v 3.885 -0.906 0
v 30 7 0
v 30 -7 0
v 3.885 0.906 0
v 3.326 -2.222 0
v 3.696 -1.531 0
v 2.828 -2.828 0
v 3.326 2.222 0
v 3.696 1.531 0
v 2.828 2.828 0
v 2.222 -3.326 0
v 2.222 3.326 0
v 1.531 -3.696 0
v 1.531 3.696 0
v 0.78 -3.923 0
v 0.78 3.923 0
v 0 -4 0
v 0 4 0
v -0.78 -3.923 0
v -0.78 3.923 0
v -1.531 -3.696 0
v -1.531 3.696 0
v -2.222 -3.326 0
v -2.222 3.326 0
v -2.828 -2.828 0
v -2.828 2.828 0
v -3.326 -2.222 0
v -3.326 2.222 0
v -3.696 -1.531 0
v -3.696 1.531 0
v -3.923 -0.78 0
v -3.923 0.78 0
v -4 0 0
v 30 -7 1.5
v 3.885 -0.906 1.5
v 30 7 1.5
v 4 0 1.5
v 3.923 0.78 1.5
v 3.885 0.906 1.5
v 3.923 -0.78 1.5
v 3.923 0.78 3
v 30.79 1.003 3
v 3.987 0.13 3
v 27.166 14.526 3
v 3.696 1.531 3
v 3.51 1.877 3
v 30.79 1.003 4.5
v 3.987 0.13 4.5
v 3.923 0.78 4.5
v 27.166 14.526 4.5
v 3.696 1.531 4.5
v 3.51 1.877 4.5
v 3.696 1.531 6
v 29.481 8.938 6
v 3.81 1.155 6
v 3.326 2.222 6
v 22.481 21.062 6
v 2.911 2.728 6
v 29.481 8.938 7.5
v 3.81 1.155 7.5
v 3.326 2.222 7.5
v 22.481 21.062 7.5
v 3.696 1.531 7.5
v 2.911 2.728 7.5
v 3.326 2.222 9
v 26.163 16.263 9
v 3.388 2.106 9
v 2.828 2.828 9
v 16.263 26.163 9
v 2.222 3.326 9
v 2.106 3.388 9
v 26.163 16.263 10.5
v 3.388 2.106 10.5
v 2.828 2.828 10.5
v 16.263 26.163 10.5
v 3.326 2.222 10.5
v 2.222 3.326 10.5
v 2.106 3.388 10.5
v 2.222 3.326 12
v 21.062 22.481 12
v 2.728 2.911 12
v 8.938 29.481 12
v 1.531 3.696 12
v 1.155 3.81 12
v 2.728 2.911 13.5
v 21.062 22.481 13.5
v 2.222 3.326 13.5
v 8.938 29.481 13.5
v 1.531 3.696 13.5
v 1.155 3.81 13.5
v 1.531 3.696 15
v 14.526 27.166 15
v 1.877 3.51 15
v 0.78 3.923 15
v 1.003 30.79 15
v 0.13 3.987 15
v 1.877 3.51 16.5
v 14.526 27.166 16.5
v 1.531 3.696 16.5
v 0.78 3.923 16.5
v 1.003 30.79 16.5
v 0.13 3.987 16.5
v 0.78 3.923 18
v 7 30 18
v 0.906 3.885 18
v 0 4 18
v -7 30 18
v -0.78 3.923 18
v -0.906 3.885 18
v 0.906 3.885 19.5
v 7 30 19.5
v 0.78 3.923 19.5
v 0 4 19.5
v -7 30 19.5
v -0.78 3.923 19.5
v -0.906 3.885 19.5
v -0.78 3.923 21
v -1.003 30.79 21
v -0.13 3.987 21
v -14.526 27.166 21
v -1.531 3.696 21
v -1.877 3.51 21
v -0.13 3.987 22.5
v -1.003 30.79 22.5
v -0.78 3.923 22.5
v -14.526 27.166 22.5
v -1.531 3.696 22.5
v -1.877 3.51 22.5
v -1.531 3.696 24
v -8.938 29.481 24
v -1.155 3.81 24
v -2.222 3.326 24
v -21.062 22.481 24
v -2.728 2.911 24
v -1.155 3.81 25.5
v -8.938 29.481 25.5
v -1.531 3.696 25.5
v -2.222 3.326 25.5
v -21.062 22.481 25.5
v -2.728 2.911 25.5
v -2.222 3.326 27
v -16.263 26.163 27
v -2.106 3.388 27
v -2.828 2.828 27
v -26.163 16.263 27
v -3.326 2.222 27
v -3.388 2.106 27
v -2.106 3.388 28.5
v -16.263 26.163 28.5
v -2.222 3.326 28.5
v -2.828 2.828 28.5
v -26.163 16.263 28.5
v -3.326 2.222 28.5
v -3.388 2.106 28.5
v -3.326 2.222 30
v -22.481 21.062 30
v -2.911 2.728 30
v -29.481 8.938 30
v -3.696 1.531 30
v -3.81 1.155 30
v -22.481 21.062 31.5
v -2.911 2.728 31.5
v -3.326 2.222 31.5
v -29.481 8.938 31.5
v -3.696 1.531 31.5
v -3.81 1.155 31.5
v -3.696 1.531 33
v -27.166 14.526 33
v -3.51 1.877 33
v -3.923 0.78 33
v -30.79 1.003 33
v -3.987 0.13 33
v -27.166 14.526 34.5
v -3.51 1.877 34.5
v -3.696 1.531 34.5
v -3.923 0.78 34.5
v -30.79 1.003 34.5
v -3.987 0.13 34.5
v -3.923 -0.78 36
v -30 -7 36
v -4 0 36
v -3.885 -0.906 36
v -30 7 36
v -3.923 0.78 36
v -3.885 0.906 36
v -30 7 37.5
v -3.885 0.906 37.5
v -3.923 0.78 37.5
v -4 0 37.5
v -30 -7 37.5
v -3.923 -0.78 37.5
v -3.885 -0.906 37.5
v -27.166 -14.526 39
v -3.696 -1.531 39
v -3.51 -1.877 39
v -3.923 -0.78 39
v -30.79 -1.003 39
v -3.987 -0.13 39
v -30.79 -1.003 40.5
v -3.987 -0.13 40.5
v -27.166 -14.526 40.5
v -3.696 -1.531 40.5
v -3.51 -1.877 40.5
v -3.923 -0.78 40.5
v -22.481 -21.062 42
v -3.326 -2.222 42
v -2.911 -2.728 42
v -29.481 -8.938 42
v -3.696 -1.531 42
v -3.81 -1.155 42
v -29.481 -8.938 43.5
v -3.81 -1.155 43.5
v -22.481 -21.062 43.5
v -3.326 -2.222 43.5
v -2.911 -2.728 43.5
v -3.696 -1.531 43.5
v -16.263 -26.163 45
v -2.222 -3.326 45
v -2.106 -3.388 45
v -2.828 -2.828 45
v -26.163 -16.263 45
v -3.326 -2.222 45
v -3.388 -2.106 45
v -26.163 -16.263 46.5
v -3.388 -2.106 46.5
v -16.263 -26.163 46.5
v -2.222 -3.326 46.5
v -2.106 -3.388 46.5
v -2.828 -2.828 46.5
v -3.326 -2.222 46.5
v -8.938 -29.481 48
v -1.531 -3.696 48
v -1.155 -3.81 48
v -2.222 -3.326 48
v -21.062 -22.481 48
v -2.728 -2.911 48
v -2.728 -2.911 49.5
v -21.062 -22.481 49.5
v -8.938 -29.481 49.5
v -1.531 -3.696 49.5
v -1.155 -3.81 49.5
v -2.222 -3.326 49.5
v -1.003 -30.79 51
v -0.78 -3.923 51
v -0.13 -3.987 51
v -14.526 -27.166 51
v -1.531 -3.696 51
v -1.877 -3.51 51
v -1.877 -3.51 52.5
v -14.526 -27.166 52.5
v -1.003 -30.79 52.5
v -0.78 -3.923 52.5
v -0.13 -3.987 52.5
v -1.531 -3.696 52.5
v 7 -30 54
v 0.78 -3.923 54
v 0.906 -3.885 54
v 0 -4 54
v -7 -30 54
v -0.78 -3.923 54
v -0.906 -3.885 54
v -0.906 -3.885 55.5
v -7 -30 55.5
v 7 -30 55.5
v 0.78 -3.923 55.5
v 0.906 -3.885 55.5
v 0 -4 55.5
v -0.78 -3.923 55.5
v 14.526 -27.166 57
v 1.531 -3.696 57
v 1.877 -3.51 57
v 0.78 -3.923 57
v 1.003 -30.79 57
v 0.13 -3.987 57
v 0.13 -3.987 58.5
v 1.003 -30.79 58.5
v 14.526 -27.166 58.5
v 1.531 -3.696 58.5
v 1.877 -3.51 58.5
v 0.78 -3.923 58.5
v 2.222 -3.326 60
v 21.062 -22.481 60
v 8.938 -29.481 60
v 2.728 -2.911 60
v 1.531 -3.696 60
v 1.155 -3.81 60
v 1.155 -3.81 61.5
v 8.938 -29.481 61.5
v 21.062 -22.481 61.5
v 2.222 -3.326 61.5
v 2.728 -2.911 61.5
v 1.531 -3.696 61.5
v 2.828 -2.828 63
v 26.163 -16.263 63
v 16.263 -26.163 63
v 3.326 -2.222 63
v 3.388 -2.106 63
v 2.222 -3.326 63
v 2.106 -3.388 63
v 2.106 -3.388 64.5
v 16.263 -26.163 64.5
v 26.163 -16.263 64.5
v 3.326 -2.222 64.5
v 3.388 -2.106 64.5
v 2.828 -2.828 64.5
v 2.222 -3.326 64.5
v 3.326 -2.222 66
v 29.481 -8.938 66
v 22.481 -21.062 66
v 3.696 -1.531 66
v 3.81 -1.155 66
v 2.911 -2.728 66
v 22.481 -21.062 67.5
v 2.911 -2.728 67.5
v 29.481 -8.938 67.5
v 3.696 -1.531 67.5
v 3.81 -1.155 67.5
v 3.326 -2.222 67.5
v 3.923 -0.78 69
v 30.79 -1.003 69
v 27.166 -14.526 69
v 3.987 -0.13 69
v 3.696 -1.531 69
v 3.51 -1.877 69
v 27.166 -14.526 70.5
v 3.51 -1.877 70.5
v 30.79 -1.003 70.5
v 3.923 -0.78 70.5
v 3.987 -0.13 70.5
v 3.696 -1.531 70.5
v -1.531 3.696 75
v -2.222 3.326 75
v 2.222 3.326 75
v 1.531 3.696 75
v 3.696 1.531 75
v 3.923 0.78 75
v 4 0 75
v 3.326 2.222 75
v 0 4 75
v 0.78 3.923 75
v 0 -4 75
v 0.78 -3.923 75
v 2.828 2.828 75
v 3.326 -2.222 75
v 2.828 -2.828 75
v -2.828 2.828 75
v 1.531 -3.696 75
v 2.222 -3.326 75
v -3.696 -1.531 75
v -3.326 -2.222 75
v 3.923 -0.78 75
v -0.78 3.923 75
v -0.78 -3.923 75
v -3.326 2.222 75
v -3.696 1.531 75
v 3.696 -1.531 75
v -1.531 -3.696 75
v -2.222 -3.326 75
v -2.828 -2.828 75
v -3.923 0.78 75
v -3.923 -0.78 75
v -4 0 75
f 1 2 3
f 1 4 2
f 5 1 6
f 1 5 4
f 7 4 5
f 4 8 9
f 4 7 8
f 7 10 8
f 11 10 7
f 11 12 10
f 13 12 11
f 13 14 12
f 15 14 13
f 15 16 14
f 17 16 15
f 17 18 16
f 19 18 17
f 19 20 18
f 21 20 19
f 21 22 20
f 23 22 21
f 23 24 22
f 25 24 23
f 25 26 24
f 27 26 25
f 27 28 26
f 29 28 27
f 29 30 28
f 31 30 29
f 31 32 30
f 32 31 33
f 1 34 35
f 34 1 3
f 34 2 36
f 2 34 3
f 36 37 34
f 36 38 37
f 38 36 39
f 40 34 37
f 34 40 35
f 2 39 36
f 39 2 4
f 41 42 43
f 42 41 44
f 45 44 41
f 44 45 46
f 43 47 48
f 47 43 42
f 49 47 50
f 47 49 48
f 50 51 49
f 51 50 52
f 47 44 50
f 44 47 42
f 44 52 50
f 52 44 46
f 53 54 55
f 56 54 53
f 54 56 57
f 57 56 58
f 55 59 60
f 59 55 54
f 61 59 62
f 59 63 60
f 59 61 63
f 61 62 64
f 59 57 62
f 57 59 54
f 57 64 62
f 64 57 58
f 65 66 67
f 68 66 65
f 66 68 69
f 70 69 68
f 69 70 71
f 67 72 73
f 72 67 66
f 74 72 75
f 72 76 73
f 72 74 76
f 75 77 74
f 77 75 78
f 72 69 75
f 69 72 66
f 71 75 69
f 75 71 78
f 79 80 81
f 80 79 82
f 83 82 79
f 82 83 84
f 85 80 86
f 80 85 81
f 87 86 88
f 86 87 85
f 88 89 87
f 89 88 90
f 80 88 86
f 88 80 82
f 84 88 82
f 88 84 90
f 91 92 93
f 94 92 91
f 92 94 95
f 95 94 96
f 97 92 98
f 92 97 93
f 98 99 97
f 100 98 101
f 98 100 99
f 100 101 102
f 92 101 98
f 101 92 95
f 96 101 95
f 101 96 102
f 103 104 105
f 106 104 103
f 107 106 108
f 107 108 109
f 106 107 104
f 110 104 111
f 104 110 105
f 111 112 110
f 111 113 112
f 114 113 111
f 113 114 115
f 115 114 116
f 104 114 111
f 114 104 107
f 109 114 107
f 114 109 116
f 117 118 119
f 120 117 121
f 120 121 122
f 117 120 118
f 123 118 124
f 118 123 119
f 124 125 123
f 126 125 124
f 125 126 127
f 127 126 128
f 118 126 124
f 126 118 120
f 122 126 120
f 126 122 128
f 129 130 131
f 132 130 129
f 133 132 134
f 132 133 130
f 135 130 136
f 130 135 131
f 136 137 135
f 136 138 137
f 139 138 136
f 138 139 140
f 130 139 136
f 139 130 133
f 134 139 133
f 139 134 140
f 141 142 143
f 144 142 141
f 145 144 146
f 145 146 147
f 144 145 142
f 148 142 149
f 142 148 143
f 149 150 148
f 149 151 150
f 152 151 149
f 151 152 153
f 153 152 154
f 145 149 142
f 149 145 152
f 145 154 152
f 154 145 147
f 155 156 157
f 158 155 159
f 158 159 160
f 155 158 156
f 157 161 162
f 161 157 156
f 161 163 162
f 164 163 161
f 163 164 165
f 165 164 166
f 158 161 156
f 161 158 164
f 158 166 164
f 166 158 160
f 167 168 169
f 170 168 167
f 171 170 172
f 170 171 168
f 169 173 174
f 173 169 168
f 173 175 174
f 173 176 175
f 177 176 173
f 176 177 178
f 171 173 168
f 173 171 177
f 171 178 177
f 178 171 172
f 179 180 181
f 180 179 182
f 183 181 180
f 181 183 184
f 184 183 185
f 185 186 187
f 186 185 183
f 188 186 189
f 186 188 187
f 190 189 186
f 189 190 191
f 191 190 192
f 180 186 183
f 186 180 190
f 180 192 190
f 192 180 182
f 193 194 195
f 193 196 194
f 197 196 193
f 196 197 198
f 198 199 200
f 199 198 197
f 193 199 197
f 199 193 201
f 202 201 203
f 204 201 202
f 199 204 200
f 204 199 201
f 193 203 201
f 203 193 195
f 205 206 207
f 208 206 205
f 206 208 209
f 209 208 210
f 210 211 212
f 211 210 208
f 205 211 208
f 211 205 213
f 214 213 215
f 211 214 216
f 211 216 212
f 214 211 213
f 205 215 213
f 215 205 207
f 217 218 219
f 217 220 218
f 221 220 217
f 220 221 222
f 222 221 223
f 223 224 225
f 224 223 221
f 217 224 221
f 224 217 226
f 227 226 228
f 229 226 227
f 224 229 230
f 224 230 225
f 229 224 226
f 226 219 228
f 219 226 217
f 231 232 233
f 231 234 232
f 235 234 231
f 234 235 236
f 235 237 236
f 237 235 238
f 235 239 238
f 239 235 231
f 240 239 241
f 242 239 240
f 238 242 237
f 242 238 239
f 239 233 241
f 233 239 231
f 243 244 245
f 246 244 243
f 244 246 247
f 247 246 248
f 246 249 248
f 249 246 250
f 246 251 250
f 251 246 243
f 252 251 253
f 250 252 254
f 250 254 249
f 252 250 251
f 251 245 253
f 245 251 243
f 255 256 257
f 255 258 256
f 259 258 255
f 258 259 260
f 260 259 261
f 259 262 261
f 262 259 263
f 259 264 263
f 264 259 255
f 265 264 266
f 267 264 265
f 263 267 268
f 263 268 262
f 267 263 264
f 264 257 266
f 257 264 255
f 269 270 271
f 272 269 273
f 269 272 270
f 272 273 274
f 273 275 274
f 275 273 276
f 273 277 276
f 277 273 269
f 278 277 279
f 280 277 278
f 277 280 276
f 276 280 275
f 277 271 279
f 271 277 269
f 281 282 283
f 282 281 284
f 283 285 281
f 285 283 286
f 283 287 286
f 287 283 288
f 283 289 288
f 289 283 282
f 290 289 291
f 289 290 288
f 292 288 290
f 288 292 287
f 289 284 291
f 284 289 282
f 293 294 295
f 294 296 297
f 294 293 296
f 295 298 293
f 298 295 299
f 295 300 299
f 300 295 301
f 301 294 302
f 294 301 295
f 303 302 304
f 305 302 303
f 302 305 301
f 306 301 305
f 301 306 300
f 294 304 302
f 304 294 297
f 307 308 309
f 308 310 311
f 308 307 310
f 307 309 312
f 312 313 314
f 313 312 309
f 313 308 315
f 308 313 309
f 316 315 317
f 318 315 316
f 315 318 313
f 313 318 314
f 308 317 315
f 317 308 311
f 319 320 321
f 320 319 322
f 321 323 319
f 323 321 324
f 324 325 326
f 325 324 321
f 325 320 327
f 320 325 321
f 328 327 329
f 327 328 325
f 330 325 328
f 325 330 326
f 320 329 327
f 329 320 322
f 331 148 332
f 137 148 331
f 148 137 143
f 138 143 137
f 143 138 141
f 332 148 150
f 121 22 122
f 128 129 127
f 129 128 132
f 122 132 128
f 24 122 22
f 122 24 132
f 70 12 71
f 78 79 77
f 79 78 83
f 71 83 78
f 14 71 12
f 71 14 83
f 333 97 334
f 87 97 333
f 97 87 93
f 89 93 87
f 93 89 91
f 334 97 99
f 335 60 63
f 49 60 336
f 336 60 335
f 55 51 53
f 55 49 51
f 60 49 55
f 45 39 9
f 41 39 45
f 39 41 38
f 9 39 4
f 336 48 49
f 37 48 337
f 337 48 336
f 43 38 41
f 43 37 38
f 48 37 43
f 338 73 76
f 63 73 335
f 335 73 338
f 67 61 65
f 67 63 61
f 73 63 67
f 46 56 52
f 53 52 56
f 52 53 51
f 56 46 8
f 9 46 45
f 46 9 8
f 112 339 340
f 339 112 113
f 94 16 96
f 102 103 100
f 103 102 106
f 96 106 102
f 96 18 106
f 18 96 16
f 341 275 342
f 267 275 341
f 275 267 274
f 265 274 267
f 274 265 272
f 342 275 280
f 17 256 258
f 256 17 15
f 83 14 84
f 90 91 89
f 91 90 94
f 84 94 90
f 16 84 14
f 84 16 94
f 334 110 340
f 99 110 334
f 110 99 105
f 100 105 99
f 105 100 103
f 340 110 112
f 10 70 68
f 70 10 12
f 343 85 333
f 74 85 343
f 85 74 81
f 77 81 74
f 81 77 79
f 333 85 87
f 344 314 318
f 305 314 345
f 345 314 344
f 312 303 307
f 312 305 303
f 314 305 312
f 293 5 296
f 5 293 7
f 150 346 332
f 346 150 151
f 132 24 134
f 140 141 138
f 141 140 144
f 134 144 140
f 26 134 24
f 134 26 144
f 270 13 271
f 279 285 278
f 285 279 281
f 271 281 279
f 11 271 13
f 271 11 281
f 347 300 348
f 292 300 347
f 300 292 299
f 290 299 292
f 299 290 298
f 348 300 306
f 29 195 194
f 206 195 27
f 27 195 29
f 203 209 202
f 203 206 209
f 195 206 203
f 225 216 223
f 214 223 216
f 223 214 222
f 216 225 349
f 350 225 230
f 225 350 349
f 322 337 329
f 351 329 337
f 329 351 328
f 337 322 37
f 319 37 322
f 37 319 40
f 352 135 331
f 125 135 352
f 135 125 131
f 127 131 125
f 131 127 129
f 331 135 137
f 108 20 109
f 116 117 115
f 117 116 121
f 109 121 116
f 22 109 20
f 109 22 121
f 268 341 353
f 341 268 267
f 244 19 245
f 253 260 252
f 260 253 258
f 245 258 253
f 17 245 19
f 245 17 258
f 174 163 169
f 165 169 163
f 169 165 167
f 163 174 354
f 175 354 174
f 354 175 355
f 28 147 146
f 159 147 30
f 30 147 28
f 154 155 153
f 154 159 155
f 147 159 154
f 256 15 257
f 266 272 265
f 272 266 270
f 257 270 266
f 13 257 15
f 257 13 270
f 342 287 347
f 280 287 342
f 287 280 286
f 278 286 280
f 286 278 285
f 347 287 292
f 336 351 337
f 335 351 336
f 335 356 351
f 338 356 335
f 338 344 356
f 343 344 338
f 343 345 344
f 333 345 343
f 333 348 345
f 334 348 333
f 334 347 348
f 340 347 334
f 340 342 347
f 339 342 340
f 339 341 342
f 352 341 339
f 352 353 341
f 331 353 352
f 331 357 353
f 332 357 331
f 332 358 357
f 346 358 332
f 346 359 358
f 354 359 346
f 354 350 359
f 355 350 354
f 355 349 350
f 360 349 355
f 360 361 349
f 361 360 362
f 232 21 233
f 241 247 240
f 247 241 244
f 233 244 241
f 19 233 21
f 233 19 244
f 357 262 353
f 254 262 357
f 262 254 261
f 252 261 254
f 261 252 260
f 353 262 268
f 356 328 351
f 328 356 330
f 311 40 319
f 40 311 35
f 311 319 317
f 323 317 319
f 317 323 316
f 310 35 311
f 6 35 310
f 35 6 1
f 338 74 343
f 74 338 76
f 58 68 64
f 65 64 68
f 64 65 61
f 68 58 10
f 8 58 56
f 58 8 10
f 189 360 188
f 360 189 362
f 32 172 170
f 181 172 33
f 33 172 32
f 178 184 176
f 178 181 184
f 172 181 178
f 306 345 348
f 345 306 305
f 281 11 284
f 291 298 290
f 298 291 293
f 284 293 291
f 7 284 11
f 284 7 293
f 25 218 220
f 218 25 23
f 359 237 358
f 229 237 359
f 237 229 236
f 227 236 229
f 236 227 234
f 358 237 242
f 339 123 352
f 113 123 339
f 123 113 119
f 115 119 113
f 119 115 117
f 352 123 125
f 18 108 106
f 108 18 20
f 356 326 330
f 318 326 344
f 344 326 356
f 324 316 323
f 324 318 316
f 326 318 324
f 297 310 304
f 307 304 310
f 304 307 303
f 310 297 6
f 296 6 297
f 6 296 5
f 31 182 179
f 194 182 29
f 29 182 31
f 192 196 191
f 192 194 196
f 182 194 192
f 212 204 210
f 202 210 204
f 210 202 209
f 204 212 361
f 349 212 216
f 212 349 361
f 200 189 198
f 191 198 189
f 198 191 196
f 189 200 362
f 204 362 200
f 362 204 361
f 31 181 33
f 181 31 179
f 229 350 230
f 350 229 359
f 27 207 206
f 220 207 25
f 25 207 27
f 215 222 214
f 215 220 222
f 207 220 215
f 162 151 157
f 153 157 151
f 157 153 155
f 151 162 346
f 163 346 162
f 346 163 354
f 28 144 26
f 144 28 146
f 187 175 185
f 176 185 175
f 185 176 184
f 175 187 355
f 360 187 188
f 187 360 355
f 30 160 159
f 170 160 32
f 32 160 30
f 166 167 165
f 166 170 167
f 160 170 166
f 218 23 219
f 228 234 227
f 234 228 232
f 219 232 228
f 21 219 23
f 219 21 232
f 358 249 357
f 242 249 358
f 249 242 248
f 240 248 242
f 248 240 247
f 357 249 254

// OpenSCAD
// A spiral staircase: a wedge for each step, turned and raised a little more than the one before.
steps  = 24;	// [8:48]
rise   = 3;		// [1:6]
turn   = 15;	// [5:30]
radius = 30;	// [15:50]
$fn = 32;

cylinder(r = 4, h = steps * rise + 3);

for (i = [0 : steps - 1])
	translate([0, 0, i * rise])
		rotate([0, 0, i * turn])
			linear_extrude(1.5) polygon([[0, 0], [radius, -7], [radius, 7]]);
